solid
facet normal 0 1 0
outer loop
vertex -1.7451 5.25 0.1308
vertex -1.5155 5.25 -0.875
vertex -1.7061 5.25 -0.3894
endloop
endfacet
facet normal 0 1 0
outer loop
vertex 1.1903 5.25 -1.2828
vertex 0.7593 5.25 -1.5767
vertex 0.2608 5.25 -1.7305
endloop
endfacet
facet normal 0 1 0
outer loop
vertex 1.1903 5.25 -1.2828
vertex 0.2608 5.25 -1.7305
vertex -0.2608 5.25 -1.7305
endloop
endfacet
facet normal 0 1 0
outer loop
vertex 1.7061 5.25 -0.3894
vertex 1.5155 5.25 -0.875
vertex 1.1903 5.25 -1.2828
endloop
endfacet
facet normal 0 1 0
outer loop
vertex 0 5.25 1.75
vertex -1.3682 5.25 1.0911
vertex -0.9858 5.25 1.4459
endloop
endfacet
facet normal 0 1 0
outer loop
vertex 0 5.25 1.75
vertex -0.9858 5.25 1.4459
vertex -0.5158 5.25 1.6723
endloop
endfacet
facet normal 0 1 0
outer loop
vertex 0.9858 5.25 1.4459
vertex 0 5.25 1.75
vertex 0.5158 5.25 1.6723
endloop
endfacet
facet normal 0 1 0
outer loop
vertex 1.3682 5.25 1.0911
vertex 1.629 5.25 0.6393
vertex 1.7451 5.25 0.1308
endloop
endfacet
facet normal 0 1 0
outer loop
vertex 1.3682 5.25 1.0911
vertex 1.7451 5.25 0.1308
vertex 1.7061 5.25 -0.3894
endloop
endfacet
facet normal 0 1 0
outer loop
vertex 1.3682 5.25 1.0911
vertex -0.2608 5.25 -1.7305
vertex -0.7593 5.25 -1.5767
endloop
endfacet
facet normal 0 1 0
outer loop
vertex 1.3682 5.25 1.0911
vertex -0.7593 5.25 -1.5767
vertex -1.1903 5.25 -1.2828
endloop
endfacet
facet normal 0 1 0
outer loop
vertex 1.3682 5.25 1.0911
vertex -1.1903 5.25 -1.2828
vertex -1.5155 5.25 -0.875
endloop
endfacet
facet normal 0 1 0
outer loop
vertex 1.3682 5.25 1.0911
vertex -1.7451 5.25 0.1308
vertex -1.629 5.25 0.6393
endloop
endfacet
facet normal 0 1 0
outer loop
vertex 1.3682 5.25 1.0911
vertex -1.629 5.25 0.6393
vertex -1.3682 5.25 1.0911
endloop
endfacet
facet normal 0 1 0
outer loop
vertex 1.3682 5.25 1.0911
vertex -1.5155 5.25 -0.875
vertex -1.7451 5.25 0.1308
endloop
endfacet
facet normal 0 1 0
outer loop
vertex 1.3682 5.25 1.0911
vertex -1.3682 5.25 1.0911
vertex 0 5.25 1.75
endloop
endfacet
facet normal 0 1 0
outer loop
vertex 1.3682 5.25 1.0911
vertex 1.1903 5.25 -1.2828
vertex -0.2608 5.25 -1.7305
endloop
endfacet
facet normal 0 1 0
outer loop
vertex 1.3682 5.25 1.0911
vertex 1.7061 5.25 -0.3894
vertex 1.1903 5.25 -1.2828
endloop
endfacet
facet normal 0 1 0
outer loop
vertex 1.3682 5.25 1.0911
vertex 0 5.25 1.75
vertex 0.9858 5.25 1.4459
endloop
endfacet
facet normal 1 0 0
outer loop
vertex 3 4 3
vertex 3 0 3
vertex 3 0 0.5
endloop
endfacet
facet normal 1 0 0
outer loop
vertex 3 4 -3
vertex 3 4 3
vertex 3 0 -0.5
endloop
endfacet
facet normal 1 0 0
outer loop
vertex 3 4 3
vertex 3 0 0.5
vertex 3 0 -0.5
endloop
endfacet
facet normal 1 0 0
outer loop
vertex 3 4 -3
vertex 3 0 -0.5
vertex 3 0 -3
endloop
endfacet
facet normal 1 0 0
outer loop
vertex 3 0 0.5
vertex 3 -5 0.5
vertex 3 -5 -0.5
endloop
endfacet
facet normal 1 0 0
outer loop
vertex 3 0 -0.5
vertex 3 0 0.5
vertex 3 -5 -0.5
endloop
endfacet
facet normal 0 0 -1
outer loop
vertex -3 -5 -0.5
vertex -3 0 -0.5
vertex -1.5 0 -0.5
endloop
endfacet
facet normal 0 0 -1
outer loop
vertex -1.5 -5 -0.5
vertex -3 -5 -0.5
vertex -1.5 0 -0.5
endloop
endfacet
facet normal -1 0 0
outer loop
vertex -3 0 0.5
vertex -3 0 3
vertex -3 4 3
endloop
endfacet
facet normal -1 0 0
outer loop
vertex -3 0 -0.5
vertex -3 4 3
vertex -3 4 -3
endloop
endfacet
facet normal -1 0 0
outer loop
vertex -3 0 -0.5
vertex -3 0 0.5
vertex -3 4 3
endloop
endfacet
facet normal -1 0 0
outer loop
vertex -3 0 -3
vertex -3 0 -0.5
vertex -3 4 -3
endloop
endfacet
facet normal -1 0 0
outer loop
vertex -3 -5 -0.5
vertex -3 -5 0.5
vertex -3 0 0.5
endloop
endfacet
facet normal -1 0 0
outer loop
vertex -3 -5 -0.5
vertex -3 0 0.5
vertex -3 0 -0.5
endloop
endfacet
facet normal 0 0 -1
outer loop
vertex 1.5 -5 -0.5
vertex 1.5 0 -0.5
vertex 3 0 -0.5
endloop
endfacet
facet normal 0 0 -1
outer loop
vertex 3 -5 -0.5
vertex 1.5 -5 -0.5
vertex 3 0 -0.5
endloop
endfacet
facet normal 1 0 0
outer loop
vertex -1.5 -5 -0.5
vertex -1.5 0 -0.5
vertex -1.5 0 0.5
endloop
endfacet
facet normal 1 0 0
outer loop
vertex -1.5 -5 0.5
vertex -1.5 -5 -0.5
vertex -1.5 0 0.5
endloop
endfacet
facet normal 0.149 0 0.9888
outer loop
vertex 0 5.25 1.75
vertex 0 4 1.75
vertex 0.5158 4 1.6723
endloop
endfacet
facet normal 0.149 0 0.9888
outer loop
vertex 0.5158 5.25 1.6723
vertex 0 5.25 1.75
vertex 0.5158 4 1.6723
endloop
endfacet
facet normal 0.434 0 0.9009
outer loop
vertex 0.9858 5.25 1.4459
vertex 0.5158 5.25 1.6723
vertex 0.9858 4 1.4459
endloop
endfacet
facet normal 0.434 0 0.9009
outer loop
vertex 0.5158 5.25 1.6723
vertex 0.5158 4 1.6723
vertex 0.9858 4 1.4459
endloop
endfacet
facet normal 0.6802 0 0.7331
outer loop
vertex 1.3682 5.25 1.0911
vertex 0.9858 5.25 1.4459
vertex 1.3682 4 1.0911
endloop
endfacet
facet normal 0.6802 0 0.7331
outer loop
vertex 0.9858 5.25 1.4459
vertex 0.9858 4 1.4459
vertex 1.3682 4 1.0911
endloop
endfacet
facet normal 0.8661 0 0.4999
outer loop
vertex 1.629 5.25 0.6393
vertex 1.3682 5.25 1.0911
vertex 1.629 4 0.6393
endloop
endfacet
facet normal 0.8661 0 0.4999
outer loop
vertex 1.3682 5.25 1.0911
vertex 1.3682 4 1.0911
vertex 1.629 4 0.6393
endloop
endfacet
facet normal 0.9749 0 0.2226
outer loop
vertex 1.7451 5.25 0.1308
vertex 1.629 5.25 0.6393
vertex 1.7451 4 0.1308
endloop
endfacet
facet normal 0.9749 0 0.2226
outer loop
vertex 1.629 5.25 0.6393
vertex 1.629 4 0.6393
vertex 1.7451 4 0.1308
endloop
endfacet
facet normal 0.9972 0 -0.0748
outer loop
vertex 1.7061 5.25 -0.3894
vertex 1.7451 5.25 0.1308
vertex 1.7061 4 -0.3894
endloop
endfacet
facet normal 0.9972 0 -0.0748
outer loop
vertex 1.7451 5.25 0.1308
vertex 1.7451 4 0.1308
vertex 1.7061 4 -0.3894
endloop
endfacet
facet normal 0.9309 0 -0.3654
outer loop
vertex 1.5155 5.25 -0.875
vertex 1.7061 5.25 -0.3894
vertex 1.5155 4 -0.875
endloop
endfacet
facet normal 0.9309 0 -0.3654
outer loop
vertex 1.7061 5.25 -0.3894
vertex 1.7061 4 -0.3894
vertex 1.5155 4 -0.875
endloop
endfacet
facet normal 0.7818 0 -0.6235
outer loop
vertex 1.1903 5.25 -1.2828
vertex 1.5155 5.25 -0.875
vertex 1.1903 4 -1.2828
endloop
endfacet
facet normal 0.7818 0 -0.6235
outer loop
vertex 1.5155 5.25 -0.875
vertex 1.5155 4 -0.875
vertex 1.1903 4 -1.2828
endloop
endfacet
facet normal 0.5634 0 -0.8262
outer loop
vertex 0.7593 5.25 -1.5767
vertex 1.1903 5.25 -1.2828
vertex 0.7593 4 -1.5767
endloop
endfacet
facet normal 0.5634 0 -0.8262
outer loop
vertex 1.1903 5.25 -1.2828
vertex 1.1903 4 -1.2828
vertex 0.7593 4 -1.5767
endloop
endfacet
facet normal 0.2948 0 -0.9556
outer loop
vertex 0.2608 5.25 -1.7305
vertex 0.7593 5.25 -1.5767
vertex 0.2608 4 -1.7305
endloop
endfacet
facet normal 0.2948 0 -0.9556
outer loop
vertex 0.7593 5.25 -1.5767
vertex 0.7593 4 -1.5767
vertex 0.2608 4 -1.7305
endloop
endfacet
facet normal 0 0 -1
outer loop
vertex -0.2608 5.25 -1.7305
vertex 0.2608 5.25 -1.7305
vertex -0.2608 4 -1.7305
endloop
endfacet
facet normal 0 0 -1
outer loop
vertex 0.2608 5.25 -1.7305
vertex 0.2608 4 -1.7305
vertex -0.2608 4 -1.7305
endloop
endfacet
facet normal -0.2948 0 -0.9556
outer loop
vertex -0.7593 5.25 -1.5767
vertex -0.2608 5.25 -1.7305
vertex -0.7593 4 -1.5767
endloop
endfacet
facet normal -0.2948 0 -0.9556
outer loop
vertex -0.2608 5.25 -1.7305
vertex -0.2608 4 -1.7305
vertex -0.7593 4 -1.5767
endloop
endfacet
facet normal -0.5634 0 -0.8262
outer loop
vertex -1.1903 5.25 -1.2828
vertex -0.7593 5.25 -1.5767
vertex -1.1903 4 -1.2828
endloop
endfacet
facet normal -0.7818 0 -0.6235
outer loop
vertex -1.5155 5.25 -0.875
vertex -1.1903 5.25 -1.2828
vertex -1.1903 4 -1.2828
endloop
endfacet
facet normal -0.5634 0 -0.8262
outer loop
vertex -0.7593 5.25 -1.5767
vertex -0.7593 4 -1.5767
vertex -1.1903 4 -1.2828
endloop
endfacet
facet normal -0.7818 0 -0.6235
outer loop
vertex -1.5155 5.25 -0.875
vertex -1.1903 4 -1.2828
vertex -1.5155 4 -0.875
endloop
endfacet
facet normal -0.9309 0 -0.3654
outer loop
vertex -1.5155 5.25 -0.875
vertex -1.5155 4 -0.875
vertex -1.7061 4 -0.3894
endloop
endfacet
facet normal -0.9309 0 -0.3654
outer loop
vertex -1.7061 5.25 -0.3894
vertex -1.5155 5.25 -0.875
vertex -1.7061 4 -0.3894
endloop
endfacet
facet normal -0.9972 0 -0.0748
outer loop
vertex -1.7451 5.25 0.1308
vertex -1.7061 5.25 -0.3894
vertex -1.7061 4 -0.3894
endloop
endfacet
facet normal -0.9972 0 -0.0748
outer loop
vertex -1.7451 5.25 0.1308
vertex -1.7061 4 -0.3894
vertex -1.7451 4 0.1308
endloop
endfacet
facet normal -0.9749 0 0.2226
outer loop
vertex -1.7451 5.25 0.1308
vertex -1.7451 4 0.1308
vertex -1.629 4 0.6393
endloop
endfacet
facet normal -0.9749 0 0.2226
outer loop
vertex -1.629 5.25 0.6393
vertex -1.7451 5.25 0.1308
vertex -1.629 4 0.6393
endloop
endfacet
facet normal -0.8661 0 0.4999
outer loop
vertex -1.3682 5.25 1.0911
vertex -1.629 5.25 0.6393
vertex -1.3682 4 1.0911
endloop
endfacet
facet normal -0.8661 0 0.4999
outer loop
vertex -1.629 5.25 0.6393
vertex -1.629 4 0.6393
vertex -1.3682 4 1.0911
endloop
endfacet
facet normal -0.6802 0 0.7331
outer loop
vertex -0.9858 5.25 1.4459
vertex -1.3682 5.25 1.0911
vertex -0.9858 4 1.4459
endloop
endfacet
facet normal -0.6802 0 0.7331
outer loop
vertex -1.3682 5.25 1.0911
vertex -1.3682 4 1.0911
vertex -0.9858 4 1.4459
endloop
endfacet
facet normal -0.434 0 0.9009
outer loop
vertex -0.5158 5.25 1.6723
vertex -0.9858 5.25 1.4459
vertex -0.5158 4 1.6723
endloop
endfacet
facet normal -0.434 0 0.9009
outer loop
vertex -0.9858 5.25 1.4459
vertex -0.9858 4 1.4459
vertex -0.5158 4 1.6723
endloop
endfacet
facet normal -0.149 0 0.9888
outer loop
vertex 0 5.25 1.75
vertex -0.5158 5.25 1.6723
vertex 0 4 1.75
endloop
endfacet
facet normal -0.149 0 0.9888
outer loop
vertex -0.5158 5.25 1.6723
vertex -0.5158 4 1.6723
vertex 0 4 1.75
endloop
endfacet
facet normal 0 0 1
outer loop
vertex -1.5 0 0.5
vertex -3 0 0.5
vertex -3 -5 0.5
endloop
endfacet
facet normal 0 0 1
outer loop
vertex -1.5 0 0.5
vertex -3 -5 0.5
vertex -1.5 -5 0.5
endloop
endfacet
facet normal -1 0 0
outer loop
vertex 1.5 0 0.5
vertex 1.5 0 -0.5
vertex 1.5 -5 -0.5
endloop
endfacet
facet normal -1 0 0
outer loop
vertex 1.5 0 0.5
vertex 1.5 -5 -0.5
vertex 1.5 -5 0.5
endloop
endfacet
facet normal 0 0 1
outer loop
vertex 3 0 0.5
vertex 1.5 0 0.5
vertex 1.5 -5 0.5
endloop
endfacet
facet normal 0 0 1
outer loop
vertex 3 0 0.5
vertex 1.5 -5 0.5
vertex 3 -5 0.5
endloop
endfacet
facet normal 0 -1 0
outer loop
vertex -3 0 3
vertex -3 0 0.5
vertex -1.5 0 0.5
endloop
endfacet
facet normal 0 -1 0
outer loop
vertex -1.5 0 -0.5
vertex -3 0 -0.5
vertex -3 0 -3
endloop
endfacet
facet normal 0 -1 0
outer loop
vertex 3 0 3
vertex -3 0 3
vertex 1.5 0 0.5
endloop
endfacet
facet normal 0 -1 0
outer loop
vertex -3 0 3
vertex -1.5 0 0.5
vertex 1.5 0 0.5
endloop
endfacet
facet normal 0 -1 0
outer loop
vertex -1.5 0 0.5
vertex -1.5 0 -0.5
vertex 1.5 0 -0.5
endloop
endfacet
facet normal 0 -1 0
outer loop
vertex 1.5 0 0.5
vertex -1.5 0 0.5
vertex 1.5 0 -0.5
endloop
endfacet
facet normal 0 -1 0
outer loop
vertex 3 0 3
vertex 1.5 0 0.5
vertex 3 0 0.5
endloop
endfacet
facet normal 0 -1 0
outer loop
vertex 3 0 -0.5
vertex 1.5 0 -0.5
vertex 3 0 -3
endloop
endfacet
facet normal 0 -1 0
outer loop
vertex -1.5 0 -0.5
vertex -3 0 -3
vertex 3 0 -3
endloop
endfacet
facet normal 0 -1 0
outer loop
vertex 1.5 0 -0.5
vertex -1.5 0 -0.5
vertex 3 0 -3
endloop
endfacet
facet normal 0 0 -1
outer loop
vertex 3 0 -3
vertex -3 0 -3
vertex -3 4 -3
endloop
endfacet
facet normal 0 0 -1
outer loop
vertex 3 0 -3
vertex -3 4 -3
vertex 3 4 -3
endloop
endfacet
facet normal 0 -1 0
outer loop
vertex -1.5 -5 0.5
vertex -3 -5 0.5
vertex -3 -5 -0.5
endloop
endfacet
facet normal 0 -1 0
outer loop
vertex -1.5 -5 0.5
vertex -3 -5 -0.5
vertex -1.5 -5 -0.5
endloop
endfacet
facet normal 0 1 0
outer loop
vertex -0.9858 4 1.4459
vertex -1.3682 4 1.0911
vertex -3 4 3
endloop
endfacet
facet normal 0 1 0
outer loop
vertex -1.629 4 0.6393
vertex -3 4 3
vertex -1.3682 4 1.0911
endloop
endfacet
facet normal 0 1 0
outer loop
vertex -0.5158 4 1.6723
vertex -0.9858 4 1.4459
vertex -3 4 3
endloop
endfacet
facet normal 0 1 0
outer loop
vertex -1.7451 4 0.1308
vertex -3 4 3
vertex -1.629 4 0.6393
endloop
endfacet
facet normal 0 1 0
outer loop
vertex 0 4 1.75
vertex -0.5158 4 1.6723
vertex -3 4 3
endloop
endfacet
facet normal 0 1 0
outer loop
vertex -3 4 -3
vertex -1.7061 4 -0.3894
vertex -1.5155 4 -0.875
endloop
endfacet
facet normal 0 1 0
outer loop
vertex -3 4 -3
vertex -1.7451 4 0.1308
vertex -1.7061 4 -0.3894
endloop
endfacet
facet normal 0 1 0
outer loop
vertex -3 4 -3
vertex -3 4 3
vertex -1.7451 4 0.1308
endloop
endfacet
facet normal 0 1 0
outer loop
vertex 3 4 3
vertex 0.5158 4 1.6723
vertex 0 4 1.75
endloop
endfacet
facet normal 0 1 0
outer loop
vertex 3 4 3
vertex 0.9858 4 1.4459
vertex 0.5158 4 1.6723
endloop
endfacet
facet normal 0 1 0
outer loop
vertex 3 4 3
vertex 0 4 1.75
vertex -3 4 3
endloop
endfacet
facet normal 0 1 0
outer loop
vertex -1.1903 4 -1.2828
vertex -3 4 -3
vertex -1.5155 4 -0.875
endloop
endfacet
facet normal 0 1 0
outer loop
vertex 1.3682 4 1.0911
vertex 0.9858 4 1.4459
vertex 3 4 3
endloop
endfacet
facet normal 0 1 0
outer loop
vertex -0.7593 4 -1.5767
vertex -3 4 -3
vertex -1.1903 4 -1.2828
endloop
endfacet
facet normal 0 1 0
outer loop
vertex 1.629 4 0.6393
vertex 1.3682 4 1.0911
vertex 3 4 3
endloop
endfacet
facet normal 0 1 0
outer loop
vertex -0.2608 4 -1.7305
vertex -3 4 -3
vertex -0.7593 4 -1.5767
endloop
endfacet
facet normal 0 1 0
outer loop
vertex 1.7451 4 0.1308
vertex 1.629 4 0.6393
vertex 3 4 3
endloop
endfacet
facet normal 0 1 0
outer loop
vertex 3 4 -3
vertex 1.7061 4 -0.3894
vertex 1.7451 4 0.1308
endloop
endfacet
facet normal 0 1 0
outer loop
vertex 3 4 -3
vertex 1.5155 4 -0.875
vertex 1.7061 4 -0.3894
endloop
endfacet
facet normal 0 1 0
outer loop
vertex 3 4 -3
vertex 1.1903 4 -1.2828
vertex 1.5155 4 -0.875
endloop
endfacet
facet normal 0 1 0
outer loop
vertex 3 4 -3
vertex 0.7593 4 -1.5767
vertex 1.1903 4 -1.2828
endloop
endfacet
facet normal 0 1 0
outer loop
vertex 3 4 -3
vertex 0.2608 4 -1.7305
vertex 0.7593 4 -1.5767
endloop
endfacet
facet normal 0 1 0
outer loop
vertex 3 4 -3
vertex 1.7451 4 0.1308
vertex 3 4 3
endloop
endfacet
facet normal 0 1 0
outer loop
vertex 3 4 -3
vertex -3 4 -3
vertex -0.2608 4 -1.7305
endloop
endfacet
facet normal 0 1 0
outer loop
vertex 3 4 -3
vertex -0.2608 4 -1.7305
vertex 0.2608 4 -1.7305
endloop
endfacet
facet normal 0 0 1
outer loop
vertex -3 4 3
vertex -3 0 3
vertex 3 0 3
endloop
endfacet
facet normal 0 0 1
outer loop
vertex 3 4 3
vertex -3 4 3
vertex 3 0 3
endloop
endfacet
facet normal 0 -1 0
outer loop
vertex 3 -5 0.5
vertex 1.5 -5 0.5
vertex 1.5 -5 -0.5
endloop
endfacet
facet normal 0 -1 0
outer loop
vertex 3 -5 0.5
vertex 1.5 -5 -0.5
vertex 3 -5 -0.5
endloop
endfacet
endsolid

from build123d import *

# Parameters (mm, degrees)
SKETCH1_W           = 6
SKETCH1_H           = 6
BOSS_EXTRUDE1_DEPTH = 4
SKETCH2_R           = 1.75
BOSS_EXTRUDE2_DEPTH = 1.25
SKETCH3_W           = 1.5
SKETCH3_H           = 1
BOSS_EXTRUDE3_DEPTH = 5


with BuildPart() as part:
    # Sketch1 → Boss-Extrude1 (new body)
    with BuildSketch(Plane(origin=(0, 0, 0), x_dir=(1, 0, 0), z_dir=(0, 1, 0))):
        Rectangle(SKETCH1_W, SKETCH1_H)
    extrude(amount=BOSS_EXTRUDE1_DEPTH)

    # Sketch2 → Boss-Extrude2 (add)
    with BuildSketch(Plane(origin=(0, 4, 0), x_dir=(1, 0, 0), z_dir=(0, 1, 0))):
        with Locations(Location((0, 0, 0), (0, 0, 270))):
            Circle(SKETCH2_R)
    extrude(amount=BOSS_EXTRUDE2_DEPTH)

    # Sketch3 → Boss-Extrude3 (add)
    with BuildSketch(Plane.XZ):
        with Locations((2.25, 0)):
            Rectangle(SKETCH3_W, SKETCH3_H)
        with Locations((-2.25, 0)):
            Rectangle(SKETCH3_W, SKETCH3_H)
    extrude(amount=BOSS_EXTRUDE3_DEPTH)


solid = part.part
